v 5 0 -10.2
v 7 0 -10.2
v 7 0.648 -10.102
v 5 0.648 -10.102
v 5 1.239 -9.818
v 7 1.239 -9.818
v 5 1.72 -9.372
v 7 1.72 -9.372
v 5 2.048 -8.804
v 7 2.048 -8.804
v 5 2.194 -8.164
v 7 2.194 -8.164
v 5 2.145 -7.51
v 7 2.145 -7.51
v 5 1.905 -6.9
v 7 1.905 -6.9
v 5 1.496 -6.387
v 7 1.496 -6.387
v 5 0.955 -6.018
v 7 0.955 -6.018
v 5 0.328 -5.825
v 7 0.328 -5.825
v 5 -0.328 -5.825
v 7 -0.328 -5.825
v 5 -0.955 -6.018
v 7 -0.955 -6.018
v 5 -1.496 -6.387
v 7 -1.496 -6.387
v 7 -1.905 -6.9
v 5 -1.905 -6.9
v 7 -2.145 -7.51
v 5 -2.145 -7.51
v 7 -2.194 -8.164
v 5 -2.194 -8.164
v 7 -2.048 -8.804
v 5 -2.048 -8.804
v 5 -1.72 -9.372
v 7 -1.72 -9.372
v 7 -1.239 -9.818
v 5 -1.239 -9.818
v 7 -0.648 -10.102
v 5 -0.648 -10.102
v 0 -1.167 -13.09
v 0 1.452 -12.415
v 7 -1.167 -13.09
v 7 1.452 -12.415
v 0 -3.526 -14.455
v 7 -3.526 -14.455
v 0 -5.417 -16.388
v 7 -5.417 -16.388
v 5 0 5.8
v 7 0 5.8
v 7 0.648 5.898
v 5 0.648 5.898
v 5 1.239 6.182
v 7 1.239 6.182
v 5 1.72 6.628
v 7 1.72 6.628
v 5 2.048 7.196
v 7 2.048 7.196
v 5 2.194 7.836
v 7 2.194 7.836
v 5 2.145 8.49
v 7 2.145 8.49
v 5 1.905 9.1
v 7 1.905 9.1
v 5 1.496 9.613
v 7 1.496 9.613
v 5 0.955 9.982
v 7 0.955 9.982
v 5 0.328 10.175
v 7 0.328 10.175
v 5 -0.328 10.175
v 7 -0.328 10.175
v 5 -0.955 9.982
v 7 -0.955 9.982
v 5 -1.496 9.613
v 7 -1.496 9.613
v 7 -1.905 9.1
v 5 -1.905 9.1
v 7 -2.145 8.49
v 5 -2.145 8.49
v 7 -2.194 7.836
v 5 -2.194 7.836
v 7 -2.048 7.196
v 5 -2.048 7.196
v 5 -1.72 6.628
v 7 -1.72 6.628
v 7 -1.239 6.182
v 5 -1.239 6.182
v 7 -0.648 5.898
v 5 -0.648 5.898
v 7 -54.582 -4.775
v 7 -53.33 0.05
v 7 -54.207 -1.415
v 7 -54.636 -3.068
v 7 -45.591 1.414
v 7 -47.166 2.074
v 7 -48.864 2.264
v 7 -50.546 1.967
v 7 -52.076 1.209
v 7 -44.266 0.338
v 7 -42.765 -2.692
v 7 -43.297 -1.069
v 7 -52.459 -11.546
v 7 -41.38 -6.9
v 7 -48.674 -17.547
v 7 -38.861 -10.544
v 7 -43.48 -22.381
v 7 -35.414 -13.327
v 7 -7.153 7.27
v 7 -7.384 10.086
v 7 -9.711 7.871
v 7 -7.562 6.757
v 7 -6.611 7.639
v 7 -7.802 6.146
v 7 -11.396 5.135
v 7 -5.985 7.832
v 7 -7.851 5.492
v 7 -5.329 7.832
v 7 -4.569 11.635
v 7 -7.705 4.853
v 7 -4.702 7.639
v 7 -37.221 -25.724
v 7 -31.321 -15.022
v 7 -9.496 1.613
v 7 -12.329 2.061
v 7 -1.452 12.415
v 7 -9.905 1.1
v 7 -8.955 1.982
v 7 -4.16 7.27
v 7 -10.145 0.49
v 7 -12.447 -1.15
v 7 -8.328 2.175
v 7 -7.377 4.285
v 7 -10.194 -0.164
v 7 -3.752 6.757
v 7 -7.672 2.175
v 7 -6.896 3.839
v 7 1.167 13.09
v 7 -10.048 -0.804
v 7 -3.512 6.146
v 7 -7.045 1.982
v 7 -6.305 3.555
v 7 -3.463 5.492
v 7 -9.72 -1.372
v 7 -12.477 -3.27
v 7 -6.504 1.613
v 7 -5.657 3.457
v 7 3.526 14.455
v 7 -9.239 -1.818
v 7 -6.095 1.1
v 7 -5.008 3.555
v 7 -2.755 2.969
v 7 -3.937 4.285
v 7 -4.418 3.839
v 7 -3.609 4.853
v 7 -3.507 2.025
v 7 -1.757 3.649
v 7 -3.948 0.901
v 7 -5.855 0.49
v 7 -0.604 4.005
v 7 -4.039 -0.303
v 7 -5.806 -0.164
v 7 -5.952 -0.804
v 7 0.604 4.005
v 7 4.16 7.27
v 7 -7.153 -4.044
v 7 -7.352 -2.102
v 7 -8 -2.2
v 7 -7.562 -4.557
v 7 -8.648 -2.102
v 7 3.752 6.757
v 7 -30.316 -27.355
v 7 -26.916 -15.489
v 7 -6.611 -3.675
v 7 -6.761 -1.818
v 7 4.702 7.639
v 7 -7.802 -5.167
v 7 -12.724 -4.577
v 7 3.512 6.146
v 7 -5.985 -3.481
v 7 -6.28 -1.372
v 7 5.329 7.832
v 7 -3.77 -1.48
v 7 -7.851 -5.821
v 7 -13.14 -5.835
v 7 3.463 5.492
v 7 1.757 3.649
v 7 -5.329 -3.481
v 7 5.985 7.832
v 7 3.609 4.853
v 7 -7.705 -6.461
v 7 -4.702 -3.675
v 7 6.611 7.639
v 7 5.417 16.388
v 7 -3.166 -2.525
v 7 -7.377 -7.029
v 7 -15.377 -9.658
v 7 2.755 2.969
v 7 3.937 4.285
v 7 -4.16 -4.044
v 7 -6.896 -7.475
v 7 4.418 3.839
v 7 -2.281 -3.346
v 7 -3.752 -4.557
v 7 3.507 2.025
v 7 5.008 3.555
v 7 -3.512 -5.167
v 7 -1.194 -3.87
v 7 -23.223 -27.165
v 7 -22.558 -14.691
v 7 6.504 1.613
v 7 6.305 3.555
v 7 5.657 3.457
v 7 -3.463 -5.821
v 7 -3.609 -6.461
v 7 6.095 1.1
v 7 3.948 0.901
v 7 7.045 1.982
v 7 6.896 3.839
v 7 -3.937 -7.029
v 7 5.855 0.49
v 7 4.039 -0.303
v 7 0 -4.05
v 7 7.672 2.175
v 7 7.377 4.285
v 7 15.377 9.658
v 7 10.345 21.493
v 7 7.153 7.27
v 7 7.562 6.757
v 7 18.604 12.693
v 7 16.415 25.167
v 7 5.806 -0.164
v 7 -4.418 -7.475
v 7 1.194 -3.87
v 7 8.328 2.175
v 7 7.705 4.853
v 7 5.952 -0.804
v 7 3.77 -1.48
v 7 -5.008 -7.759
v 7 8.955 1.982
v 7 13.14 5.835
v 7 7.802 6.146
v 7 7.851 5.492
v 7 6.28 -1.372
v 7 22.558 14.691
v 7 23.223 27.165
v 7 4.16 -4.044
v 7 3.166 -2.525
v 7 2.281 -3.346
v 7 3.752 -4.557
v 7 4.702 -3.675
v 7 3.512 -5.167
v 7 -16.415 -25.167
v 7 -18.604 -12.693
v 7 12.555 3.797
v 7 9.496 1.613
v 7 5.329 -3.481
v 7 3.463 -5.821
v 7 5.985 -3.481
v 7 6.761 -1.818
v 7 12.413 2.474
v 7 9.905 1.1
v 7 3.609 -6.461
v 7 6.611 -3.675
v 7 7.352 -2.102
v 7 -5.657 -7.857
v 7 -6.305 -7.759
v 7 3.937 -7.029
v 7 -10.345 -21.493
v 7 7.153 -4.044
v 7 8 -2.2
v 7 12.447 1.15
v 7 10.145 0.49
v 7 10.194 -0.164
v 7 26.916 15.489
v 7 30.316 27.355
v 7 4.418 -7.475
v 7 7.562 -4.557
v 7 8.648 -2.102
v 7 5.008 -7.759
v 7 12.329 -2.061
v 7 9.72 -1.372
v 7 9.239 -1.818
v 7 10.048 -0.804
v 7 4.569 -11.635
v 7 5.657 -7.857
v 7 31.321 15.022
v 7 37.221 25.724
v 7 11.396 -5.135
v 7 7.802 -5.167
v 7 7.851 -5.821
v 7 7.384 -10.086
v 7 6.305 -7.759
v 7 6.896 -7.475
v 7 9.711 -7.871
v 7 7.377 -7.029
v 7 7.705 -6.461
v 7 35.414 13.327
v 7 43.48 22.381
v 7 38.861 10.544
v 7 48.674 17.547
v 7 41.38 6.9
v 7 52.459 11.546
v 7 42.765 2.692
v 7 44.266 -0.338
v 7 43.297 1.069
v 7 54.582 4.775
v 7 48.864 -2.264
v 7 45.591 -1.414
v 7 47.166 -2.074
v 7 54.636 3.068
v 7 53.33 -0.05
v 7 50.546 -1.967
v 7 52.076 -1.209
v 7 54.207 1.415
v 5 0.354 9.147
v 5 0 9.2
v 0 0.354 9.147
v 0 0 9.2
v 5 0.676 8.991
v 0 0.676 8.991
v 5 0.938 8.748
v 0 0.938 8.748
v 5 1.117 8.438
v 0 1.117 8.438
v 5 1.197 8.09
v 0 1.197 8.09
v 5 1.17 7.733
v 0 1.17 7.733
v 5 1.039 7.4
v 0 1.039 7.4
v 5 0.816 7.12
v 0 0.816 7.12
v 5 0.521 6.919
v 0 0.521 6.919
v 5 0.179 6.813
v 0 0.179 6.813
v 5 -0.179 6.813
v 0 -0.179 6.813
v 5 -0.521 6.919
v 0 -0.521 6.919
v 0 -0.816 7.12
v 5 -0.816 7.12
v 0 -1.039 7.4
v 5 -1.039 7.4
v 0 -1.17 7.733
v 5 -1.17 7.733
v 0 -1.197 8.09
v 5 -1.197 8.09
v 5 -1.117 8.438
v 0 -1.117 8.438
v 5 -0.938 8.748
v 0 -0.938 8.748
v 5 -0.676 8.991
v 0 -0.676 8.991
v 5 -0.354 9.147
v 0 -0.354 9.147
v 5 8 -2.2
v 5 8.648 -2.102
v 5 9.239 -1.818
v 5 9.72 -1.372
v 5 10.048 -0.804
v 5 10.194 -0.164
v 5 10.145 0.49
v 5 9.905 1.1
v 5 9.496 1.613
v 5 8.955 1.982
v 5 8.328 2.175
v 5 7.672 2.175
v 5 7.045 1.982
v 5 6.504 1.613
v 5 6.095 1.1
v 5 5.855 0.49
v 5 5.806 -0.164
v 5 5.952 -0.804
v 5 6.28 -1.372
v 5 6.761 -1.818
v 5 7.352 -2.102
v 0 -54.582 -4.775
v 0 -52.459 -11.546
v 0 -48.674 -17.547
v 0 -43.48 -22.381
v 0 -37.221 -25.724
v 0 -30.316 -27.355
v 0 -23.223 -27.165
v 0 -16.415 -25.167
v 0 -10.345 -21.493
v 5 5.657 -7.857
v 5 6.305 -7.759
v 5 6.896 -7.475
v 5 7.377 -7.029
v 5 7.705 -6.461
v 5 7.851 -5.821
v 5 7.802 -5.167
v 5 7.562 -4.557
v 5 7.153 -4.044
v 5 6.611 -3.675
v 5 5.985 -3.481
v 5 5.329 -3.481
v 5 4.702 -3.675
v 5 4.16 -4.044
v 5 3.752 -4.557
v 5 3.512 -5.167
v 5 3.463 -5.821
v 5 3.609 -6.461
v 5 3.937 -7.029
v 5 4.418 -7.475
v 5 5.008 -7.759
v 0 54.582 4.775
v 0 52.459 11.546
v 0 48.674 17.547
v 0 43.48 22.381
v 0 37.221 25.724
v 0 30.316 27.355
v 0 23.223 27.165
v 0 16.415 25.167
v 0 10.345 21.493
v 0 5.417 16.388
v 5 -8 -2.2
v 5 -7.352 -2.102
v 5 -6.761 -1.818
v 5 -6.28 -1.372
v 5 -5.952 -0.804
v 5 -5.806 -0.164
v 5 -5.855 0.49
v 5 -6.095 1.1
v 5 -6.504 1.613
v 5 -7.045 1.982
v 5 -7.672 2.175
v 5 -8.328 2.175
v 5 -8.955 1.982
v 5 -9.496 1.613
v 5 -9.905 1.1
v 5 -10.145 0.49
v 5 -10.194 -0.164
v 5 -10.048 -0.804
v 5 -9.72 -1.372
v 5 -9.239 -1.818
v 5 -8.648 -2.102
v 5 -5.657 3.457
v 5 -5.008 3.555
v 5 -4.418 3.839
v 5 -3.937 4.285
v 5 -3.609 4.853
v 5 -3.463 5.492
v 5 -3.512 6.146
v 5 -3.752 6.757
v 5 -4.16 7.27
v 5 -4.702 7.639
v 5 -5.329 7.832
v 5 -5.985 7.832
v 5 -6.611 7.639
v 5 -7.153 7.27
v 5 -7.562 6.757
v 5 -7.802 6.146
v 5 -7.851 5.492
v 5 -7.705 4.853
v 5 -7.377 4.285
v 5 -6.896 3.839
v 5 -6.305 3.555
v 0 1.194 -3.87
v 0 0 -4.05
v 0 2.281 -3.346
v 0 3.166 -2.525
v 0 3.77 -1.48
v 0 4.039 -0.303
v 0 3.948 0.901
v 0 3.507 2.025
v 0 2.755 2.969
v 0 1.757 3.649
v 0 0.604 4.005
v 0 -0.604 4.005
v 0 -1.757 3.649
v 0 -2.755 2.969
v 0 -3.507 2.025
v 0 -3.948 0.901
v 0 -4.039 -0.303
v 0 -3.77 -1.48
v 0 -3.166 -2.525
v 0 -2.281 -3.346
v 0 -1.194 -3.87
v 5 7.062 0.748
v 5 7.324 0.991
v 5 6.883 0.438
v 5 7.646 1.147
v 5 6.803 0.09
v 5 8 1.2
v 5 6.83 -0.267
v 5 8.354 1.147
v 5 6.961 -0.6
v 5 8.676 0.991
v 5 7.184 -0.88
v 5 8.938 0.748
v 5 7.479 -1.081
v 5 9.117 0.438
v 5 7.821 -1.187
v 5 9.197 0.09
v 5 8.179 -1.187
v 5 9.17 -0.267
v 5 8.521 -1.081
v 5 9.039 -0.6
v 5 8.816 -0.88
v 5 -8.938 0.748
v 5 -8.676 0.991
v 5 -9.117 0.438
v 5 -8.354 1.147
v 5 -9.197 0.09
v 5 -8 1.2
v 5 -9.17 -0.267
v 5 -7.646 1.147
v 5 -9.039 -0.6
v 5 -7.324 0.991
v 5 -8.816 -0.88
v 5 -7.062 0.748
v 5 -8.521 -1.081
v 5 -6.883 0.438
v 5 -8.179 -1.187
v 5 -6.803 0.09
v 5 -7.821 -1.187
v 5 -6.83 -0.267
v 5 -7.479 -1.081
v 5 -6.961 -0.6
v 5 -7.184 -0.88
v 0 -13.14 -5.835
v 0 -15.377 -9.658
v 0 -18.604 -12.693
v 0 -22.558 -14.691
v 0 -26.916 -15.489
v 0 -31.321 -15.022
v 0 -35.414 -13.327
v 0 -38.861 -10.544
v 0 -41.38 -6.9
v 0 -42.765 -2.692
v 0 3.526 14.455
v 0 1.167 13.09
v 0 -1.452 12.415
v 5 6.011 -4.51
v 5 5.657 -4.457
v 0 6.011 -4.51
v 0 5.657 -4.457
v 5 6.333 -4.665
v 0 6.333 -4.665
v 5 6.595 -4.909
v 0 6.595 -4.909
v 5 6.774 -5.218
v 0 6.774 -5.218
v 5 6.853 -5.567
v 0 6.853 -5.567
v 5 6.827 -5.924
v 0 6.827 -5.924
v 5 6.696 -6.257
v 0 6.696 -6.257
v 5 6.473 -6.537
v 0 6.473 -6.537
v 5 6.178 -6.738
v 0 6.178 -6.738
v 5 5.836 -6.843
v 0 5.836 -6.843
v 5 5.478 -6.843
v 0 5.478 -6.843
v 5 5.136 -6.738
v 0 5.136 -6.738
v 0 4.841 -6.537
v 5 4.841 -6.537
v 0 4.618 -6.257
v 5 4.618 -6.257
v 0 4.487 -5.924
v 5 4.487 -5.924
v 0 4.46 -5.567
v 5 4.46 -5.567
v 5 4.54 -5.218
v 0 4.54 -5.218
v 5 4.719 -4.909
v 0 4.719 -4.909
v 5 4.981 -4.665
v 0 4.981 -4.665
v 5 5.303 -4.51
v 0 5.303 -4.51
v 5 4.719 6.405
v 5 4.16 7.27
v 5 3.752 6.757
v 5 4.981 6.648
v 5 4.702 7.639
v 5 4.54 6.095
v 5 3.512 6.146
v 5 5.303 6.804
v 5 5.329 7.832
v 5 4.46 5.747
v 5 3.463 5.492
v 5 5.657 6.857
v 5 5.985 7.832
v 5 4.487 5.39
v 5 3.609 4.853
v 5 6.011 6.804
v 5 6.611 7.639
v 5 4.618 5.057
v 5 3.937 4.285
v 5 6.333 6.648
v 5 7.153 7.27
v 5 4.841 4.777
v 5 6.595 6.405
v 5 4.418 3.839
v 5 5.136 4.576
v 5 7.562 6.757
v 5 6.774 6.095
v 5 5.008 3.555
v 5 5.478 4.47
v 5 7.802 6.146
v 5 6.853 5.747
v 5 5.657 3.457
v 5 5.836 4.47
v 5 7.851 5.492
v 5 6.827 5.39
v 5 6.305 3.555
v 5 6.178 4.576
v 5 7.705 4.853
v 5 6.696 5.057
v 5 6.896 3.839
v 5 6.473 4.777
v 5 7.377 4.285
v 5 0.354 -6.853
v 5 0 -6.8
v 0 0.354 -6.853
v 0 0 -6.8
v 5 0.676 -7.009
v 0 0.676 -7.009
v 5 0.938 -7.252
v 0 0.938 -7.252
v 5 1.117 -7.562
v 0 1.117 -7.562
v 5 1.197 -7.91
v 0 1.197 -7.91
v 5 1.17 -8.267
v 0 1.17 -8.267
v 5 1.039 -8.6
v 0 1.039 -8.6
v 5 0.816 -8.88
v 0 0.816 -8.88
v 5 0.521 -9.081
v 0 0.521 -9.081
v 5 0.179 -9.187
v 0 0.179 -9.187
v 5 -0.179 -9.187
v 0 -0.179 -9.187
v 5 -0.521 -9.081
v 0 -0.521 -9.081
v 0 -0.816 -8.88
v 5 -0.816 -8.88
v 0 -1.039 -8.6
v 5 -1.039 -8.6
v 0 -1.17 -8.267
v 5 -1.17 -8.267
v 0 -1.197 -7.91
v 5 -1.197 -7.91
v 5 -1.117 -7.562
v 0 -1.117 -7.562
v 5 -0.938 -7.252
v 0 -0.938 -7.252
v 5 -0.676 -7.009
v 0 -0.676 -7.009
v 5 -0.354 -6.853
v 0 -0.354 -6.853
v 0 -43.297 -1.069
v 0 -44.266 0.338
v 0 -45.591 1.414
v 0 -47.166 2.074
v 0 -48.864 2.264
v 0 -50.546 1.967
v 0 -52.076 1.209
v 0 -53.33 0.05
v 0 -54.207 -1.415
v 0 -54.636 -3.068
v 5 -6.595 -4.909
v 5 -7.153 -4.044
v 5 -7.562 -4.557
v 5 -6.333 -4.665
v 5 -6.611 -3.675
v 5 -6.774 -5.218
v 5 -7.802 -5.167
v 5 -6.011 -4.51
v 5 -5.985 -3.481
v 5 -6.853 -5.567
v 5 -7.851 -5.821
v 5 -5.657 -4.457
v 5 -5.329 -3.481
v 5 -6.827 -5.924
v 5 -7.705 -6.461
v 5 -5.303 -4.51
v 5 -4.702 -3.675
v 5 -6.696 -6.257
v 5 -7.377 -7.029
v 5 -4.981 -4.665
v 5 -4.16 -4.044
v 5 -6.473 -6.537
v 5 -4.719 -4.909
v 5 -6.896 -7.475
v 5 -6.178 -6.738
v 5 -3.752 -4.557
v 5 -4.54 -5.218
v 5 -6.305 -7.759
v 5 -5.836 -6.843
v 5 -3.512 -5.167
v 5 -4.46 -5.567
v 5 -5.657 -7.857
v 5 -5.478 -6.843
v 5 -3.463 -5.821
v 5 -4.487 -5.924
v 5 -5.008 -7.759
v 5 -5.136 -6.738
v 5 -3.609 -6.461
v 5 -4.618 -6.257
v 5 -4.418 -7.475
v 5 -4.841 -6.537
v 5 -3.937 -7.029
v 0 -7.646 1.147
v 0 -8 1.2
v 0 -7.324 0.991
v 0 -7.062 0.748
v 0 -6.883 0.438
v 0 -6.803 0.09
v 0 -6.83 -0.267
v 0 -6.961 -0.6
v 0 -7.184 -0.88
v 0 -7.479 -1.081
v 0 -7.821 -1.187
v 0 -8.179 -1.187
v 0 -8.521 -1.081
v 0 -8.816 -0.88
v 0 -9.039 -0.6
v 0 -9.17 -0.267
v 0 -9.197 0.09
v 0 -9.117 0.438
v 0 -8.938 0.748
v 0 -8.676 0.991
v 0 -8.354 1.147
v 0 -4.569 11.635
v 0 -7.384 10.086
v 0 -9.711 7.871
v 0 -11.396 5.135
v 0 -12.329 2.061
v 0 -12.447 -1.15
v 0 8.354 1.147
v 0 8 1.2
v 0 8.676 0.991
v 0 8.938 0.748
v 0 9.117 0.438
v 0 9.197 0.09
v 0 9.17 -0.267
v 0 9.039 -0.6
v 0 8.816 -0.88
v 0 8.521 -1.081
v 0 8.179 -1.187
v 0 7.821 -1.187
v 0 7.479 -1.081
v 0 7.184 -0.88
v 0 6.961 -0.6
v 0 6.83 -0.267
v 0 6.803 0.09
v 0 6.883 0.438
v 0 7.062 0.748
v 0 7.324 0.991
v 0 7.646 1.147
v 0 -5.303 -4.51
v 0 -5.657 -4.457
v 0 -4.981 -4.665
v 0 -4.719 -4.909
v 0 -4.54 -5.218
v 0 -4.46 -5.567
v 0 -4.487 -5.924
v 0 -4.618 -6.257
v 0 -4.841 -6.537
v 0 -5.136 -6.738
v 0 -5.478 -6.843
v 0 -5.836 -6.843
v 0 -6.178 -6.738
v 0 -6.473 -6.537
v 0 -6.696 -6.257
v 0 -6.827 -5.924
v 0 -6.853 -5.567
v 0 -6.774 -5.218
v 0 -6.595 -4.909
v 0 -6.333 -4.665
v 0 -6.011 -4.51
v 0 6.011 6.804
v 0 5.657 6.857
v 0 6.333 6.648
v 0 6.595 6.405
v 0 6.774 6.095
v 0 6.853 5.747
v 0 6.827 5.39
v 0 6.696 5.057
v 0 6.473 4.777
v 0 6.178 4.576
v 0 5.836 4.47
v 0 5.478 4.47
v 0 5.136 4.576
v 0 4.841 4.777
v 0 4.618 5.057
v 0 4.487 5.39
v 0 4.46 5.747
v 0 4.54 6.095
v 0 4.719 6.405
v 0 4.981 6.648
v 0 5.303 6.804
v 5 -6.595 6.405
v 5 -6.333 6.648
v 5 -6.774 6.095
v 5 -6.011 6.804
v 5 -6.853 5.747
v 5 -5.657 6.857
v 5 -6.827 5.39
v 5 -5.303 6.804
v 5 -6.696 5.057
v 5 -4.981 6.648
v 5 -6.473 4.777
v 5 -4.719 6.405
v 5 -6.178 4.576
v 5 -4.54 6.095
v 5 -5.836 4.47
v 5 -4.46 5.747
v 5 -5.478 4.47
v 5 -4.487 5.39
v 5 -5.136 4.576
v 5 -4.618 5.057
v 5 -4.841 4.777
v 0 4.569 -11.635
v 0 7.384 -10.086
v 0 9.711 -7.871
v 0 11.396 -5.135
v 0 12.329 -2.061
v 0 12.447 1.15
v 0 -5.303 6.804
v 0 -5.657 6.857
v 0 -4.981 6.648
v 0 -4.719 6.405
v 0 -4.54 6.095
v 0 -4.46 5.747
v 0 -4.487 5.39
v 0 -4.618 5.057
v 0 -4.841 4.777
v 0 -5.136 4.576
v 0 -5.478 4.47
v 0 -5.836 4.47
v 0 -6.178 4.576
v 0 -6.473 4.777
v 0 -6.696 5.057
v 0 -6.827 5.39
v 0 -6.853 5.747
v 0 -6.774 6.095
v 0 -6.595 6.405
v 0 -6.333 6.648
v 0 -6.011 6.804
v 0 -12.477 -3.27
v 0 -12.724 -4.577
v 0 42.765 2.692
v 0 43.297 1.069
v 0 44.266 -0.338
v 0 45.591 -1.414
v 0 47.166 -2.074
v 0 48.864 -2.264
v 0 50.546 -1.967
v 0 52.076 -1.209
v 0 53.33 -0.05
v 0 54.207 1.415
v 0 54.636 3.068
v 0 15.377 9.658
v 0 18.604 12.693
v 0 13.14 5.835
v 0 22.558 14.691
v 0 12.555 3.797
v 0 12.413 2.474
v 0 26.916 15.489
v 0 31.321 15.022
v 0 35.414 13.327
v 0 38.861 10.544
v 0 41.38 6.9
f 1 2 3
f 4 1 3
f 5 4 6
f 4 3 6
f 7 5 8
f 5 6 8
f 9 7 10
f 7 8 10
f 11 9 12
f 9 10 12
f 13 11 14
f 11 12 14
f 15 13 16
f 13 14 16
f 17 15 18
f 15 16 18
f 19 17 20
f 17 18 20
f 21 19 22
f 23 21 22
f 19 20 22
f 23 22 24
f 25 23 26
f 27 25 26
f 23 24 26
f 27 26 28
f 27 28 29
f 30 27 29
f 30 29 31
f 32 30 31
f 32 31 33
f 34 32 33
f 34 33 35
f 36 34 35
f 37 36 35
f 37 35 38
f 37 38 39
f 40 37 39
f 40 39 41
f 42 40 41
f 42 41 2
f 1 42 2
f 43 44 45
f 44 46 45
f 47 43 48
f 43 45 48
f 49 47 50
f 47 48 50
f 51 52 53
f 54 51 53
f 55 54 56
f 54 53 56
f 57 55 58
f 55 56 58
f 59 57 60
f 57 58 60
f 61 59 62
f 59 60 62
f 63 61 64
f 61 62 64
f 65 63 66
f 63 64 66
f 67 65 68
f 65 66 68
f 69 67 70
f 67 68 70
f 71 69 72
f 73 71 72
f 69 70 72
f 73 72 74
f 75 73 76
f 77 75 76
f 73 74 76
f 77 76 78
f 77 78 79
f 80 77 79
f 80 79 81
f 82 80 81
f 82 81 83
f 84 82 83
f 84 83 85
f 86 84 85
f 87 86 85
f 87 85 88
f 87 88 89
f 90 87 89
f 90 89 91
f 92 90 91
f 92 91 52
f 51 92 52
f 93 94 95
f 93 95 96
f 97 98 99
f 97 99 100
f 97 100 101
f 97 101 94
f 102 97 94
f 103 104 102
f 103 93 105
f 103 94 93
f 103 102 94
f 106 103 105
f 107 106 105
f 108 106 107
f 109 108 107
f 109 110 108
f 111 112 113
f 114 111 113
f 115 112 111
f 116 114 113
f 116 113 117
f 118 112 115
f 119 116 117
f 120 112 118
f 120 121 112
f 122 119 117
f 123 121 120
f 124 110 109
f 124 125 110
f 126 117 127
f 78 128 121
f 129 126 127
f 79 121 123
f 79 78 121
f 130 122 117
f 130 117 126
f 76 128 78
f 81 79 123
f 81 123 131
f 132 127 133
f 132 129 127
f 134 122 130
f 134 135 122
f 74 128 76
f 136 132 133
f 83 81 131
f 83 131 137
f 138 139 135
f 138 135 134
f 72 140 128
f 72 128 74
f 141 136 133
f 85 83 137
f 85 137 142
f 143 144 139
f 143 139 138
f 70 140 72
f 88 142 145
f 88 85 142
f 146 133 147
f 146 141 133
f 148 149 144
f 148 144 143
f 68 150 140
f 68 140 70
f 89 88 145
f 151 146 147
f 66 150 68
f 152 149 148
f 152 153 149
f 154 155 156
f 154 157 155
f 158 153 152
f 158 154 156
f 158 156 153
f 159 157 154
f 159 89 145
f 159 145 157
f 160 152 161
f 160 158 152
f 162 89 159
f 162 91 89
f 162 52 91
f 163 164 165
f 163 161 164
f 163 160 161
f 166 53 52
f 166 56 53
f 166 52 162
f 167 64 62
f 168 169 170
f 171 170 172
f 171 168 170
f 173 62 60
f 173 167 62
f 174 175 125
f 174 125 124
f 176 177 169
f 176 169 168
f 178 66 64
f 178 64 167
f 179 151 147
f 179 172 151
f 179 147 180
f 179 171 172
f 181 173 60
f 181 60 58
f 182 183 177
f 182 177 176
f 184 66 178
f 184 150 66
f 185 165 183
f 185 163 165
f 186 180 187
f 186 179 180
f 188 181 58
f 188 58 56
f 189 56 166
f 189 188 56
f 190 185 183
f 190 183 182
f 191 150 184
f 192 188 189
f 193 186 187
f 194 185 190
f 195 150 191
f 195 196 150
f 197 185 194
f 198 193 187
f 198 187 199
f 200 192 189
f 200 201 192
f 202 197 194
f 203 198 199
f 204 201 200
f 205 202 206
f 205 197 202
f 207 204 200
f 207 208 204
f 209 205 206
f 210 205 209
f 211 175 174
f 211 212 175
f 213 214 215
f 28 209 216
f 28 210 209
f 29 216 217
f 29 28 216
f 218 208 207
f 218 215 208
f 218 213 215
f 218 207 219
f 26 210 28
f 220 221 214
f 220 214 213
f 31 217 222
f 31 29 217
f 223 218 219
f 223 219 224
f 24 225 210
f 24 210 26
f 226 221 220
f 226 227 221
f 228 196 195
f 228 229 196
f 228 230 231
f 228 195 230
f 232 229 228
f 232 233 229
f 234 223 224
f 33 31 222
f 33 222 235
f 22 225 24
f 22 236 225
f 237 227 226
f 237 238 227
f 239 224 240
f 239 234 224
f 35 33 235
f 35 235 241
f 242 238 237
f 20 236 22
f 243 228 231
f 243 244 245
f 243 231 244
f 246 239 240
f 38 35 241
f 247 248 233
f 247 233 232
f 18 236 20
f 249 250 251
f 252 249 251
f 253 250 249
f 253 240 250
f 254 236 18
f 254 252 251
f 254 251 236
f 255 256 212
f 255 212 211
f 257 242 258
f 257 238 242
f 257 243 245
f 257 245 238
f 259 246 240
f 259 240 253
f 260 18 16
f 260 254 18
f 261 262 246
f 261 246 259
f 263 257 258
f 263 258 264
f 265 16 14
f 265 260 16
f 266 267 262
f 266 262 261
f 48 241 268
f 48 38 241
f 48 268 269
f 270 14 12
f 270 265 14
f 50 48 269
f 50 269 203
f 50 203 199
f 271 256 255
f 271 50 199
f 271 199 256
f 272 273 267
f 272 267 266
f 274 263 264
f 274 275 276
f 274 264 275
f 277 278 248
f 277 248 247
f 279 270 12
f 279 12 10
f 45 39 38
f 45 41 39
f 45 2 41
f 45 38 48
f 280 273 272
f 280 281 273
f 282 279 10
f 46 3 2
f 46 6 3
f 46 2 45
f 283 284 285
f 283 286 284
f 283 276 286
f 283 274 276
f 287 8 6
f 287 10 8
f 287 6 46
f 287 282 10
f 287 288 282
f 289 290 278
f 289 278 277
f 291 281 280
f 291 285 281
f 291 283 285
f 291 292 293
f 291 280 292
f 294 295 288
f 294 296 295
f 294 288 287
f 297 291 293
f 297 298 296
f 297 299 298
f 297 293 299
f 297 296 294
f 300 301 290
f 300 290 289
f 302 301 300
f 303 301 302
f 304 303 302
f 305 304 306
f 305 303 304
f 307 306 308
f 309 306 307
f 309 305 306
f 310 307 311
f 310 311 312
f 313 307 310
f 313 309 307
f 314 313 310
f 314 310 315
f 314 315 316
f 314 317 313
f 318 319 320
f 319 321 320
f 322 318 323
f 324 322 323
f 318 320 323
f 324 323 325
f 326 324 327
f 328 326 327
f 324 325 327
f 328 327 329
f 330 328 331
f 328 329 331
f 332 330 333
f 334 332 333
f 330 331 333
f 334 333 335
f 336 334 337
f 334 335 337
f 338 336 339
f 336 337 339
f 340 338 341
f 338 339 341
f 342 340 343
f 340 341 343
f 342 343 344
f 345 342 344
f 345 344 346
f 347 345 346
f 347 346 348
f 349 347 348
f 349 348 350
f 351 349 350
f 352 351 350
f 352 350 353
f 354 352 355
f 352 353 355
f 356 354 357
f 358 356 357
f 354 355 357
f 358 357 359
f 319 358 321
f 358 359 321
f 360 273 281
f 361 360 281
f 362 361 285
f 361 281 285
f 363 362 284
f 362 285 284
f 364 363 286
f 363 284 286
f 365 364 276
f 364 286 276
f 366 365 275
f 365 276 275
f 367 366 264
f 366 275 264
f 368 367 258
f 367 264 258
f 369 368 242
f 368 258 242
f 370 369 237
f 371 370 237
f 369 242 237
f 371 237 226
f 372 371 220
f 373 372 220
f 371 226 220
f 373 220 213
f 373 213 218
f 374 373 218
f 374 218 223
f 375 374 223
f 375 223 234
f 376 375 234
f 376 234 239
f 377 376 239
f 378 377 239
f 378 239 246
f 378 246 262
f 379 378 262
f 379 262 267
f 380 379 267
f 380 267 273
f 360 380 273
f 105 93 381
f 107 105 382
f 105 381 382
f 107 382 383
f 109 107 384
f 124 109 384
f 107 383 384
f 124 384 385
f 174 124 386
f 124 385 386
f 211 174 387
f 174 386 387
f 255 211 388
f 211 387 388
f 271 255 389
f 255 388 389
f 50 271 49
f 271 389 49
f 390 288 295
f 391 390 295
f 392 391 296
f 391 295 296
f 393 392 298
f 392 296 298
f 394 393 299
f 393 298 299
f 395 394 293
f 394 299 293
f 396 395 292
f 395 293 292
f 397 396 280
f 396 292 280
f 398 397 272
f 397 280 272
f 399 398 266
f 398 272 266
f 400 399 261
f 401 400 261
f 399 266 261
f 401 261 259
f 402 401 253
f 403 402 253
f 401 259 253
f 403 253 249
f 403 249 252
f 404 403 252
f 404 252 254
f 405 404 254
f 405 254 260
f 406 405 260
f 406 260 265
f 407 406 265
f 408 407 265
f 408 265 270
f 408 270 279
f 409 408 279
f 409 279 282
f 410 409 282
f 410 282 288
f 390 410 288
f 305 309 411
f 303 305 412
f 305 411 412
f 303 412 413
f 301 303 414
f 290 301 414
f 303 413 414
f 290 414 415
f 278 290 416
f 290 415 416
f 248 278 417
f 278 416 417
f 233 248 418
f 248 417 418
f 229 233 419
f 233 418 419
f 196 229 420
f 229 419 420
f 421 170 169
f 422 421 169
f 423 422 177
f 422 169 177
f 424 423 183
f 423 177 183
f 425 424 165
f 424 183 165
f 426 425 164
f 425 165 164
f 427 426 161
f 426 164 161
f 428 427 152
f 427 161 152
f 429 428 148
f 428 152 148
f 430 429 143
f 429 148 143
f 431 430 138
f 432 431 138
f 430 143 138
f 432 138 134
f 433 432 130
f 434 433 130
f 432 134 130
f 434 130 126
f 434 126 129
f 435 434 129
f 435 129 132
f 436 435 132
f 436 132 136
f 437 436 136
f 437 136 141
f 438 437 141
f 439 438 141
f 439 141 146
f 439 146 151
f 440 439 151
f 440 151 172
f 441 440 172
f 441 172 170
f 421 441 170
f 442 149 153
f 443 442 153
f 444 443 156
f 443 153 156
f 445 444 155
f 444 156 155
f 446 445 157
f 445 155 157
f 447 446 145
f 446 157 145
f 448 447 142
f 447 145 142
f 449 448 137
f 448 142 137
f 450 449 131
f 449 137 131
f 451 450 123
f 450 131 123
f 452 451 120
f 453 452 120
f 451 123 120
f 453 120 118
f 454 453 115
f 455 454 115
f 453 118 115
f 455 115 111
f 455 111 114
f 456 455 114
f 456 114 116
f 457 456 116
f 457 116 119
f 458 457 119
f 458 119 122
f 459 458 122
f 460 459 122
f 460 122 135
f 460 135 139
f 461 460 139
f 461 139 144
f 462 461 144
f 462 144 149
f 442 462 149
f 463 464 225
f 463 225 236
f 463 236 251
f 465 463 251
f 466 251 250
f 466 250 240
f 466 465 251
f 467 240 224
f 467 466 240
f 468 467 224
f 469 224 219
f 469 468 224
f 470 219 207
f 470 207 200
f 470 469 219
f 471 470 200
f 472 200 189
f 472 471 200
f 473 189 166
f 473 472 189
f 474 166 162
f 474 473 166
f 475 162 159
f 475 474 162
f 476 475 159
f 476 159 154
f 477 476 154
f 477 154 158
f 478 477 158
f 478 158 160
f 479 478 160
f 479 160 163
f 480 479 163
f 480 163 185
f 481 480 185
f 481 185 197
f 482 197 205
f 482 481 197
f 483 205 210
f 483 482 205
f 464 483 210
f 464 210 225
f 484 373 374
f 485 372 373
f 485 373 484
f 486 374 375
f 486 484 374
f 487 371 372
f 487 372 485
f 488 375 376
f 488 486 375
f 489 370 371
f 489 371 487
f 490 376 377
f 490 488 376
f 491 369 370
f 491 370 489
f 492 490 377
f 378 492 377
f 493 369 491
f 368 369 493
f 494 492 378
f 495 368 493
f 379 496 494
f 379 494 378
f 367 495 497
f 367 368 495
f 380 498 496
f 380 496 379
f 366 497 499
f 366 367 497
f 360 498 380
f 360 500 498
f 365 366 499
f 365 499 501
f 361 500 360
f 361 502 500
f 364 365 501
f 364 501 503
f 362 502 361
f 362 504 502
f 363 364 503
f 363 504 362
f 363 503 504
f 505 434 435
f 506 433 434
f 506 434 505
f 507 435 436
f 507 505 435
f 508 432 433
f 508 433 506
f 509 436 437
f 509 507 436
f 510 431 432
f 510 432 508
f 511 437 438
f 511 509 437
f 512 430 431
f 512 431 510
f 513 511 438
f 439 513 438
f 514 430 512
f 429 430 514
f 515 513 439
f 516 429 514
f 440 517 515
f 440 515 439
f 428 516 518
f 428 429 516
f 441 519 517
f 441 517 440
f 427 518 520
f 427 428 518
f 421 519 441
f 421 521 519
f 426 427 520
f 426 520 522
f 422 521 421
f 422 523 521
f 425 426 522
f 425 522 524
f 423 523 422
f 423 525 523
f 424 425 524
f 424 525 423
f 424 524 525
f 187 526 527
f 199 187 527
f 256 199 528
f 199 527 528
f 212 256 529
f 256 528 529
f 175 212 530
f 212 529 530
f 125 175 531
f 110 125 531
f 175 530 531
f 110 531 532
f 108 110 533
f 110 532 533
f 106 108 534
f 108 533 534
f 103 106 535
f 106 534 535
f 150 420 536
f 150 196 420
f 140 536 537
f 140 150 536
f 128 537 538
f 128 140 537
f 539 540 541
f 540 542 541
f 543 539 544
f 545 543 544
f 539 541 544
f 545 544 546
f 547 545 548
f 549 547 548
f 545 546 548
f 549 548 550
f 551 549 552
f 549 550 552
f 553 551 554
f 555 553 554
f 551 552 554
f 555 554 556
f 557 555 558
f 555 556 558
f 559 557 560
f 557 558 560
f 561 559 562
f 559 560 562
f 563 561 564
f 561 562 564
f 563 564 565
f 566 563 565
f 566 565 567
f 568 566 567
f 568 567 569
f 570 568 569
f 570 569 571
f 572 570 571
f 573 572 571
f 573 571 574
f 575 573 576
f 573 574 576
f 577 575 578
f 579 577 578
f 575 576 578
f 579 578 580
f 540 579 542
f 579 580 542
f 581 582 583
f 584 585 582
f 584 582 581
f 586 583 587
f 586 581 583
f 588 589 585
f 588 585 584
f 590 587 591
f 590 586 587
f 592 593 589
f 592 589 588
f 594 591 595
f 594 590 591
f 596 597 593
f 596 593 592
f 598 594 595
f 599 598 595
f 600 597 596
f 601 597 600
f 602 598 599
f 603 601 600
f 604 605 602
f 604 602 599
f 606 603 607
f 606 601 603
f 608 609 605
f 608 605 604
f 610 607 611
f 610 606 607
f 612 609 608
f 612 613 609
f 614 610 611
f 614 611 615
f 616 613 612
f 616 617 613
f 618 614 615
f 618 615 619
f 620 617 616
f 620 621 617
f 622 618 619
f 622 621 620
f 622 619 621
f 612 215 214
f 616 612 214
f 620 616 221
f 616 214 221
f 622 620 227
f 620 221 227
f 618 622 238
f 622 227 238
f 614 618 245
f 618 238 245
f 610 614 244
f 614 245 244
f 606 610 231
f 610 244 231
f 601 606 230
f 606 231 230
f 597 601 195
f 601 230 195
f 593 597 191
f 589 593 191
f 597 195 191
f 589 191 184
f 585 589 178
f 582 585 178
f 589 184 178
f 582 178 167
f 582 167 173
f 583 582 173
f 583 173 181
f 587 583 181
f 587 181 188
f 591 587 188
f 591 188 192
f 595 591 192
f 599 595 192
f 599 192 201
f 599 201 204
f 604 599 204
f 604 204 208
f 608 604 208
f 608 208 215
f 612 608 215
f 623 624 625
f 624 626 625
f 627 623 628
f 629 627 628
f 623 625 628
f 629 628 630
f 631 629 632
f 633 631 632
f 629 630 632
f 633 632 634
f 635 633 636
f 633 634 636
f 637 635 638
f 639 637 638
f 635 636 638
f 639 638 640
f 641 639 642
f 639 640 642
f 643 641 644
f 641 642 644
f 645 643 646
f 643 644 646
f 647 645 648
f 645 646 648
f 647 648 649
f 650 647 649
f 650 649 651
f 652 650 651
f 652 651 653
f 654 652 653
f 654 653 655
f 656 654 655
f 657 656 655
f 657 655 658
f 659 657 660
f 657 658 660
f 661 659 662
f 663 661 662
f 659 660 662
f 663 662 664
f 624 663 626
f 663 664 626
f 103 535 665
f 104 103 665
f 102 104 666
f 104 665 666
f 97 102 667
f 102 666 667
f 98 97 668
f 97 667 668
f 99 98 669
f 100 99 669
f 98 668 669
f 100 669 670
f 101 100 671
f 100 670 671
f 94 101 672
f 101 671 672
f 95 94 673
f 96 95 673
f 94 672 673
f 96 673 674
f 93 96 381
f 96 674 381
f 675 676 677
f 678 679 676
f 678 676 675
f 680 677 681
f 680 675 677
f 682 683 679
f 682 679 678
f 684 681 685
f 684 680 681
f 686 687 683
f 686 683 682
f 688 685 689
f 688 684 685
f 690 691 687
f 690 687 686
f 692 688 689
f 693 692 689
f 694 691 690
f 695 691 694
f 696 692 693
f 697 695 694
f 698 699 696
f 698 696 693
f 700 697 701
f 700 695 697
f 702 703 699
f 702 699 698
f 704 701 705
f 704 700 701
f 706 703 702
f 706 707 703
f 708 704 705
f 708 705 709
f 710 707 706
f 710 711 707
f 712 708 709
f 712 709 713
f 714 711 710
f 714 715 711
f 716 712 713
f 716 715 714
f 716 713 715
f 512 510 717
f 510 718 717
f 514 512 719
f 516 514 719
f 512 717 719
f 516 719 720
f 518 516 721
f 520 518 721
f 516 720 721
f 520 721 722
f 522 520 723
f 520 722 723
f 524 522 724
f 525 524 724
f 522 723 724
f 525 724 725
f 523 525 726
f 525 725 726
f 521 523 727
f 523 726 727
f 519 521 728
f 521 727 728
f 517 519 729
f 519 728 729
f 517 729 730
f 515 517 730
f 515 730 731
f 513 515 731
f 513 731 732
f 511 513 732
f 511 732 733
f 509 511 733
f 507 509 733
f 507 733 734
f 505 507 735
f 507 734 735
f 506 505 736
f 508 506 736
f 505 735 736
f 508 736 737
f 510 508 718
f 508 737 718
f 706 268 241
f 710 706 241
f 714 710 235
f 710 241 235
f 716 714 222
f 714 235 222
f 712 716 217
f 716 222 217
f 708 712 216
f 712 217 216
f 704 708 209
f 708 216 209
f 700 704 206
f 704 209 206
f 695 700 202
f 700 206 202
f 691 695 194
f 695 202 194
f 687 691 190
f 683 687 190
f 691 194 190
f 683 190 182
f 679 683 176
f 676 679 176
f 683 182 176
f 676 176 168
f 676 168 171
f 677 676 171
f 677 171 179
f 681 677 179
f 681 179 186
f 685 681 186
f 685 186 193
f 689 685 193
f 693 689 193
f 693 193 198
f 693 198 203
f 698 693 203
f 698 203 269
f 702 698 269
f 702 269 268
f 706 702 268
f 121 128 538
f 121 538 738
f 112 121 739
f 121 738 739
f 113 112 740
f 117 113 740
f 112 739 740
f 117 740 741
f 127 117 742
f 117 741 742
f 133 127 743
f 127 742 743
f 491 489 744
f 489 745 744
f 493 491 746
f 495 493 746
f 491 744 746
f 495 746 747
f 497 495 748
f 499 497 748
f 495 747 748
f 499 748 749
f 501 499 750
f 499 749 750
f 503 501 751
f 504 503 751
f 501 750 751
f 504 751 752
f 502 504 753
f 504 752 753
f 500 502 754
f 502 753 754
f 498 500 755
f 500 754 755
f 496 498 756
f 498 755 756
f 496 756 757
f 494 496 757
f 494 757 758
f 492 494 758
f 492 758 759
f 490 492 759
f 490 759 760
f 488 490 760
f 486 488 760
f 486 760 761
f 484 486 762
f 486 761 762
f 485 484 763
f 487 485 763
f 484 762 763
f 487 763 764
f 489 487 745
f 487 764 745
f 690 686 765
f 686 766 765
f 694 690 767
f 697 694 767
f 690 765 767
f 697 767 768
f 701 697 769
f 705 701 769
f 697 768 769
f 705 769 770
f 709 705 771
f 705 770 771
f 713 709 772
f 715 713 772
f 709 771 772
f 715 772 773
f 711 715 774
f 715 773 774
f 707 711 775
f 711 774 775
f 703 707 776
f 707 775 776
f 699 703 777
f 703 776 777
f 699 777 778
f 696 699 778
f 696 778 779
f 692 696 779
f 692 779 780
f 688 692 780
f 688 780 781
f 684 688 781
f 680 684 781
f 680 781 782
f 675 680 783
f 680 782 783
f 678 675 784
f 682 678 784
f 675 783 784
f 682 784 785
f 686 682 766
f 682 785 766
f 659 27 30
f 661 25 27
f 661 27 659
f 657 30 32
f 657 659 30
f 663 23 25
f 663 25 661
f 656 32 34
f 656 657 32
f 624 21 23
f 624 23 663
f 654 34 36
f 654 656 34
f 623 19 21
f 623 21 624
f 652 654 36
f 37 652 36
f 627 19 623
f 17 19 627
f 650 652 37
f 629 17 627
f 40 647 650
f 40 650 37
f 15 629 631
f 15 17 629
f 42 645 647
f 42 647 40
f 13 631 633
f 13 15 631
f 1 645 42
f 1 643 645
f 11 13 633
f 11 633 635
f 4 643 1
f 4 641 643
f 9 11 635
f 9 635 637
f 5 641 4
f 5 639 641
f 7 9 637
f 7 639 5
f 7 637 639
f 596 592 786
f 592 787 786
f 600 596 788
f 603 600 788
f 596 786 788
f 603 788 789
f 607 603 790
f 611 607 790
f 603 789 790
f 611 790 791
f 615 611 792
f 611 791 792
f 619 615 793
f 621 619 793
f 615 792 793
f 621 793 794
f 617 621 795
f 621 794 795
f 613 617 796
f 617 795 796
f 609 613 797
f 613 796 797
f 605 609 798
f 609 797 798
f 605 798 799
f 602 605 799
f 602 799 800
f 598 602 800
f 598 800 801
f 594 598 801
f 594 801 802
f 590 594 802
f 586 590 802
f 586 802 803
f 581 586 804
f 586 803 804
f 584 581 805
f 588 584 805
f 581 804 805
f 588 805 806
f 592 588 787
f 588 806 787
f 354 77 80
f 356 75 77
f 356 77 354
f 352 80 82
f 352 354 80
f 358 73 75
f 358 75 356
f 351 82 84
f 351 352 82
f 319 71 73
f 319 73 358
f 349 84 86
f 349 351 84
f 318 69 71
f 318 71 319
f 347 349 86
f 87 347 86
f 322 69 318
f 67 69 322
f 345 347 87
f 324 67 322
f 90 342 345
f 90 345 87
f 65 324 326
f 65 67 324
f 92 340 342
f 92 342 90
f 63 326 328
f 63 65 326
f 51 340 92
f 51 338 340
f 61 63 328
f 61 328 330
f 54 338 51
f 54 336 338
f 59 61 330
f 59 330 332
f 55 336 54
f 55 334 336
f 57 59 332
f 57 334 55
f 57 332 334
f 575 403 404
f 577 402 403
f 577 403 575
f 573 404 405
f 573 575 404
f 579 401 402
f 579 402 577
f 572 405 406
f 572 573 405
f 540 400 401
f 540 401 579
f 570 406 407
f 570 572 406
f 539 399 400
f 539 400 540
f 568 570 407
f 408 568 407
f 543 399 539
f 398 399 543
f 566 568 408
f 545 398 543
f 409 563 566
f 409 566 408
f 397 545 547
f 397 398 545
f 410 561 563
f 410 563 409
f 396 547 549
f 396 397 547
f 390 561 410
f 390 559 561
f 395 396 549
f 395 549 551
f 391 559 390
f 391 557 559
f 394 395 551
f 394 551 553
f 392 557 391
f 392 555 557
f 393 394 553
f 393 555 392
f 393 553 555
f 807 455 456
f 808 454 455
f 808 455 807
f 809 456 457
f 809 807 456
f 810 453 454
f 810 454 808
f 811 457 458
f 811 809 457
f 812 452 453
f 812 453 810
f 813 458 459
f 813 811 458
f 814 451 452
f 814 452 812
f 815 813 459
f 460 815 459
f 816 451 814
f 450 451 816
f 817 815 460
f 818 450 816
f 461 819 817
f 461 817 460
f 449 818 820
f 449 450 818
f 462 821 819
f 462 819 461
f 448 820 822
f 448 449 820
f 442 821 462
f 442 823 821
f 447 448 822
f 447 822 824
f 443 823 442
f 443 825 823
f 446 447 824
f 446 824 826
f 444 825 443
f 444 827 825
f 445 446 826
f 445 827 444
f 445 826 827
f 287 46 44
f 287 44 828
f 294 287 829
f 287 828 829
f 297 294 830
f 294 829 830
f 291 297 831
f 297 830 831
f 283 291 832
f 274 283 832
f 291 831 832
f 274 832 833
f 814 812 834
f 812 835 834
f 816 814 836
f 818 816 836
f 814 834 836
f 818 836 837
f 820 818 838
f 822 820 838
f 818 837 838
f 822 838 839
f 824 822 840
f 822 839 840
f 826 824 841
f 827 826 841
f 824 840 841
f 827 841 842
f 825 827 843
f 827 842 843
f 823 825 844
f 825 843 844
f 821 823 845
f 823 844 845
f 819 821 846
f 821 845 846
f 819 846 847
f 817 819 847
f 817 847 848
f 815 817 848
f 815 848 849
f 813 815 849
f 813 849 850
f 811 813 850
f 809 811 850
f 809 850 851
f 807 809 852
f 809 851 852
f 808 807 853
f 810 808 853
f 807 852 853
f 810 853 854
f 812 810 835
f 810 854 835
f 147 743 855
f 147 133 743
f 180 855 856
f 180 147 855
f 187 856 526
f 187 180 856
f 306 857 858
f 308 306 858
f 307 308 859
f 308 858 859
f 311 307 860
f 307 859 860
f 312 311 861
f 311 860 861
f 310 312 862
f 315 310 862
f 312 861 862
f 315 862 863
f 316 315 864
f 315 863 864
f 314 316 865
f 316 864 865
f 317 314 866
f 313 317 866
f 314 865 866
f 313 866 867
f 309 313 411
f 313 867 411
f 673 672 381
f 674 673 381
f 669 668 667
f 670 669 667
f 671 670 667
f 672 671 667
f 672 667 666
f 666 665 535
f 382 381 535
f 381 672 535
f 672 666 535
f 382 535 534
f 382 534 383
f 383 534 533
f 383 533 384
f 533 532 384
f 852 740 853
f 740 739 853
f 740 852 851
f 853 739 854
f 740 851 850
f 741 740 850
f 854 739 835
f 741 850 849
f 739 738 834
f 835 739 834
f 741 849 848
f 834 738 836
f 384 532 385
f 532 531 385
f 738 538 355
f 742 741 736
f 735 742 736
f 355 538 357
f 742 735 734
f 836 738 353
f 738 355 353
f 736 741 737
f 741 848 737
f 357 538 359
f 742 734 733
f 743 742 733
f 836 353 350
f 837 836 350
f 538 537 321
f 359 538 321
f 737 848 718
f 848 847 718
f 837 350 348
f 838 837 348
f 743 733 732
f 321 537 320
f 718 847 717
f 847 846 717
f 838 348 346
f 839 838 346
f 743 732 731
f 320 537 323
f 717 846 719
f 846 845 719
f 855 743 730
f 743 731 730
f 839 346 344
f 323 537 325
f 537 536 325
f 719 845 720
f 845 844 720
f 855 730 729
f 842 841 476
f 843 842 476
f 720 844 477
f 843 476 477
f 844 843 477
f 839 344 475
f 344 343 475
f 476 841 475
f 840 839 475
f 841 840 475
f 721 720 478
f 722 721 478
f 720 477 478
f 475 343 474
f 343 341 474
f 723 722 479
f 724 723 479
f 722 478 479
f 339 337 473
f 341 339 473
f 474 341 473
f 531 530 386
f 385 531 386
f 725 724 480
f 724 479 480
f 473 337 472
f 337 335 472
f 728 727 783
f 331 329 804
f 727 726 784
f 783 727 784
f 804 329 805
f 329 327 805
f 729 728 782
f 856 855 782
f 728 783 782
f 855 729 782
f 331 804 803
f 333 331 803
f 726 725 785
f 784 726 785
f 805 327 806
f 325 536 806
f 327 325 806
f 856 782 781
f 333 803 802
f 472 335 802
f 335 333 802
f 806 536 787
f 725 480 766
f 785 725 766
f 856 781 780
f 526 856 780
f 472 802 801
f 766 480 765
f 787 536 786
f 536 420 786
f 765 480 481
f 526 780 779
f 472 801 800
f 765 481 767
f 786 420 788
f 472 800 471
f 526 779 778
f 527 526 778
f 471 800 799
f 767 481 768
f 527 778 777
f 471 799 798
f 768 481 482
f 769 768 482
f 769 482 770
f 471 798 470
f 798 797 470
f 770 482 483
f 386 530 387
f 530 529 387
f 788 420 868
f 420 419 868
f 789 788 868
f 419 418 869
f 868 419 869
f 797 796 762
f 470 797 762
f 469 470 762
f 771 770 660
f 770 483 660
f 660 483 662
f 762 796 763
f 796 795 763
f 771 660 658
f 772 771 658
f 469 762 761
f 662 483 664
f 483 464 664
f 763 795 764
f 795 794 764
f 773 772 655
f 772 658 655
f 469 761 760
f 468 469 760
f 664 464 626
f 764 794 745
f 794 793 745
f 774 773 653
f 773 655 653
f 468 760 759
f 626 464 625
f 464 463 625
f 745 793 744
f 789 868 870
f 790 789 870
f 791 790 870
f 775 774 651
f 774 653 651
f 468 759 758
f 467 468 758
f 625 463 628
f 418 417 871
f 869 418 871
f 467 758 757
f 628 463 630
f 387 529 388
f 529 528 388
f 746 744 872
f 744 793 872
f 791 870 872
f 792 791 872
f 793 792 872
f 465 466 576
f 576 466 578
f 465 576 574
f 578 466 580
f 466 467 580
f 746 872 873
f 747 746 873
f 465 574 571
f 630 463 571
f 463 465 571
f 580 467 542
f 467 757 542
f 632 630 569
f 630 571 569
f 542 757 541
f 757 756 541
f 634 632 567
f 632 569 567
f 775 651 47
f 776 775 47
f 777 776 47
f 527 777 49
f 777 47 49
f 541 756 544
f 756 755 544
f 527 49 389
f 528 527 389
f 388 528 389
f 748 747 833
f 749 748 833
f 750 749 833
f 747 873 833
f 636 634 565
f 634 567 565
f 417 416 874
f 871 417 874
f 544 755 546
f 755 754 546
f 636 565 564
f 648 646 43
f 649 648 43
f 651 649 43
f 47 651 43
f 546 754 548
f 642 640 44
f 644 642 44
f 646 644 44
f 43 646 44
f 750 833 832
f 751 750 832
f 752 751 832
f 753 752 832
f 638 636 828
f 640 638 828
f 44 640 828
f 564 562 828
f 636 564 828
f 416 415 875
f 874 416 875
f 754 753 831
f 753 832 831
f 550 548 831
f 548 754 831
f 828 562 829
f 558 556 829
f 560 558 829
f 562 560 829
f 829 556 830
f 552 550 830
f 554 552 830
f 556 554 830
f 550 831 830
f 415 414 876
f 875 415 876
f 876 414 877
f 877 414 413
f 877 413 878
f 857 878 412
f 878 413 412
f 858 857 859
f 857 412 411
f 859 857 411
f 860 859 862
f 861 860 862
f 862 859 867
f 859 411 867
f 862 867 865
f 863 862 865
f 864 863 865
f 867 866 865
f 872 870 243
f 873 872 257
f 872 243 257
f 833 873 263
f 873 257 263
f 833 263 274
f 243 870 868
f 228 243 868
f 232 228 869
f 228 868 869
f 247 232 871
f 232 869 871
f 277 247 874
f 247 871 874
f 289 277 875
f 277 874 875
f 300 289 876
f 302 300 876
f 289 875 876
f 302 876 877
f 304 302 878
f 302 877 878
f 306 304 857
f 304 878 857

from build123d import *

# Parameters (mm, degrees)
SKETCH1_R                      = 4.05
BOSS_EXTRUDE1_DEPTH            = 7
FILLET1_R                      = 10
CBORE_FOR_M2_SHCS1_D           = 2.4
CBORE_FOR_M2_SHCS1_CBORE_D     = 4.4
CBORE_FOR_M2_SHCS1_CBORE_DEPTH = 2


with BuildPart() as part:
    # Sketch1 → Boss-Extrude1 (new body)
    with BuildSketch(Plane(origin=(0, 0, 0), x_dir=(0, 0, -1), z_dir=(1, 0, 0))):
        with BuildLine():
            ThreePointArc((-2.618193655, 12.222727273), (-15.499955296, 27.462773314), (-2.691546754, 42.764520172))
            ThreePointArc((-2.691546754, 42.764520172), (2.175410698, 49.715255756), (-4.775324886, 54.582213208))
            ThreePointArc((-4.775324886, 54.582213208), (-27.223172657, 31.392154992), (-12.172889367, 2.840909091))
            ThreePointArc((-12.172889367, 2.840909091), (-8.919155658, -8.757777249), (2.618193655, -12.222727273))
            ThreePointArc((2.618193655, -12.222727273), (15.499955296, -27.462773314), (2.691546754, -42.764520172))
            ThreePointArc((2.691546754, -42.764520172), (-2.175410698, -49.715255756), (4.775324886, -54.582213208))
            ThreePointArc((4.775324886, -54.582213208), (27.223172657, -31.392154992), (12.172889367, -2.840909091))
            ThreePointArc((12.172889367, -2.840909091), (8.919155658, 8.757777249), (-2.618193655, 12.222727273))
        make_face()
        Circle(SKETCH1_R, mode=Mode.SUBTRACT)
    extrude(amount=BOSS_EXTRUDE1_DEPTH)

    # Fillet1
    fillet1_edges = [part.edges().sort_by_distance(p)[0] for p in [
        (3.5, -2.840909091, -12.172889367),
        (3.5, -12.222727273, -2.618193655),
        (3.5, 2.840909091, 12.172889367),
        (3.5, 12.222727273, 2.618193655),
    ]]
    fillet(fillet1_edges, radius=FILLET1_R)

    # CBORE for M2 SHCS1 (through all)
    with Locations(Plane(origin=(7, 0, 0), x_dir=(0, 0, -1), z_dir=(1, 0, 0))):
        with Locations((-5.656854249, 5.656854249), (0, 8), (5.656854249, 5.656854249), (8, 0), (5.656854249, -5.656854249), (0, -8), (-5.656854249, -5.656854249), (-8, 0)):
            CounterBoreHole(CBORE_FOR_M2_SHCS1_D / 2, CBORE_FOR_M2_SHCS1_CBORE_D / 2, CBORE_FOR_M2_SHCS1_CBORE_DEPTH)


solid = part.part
